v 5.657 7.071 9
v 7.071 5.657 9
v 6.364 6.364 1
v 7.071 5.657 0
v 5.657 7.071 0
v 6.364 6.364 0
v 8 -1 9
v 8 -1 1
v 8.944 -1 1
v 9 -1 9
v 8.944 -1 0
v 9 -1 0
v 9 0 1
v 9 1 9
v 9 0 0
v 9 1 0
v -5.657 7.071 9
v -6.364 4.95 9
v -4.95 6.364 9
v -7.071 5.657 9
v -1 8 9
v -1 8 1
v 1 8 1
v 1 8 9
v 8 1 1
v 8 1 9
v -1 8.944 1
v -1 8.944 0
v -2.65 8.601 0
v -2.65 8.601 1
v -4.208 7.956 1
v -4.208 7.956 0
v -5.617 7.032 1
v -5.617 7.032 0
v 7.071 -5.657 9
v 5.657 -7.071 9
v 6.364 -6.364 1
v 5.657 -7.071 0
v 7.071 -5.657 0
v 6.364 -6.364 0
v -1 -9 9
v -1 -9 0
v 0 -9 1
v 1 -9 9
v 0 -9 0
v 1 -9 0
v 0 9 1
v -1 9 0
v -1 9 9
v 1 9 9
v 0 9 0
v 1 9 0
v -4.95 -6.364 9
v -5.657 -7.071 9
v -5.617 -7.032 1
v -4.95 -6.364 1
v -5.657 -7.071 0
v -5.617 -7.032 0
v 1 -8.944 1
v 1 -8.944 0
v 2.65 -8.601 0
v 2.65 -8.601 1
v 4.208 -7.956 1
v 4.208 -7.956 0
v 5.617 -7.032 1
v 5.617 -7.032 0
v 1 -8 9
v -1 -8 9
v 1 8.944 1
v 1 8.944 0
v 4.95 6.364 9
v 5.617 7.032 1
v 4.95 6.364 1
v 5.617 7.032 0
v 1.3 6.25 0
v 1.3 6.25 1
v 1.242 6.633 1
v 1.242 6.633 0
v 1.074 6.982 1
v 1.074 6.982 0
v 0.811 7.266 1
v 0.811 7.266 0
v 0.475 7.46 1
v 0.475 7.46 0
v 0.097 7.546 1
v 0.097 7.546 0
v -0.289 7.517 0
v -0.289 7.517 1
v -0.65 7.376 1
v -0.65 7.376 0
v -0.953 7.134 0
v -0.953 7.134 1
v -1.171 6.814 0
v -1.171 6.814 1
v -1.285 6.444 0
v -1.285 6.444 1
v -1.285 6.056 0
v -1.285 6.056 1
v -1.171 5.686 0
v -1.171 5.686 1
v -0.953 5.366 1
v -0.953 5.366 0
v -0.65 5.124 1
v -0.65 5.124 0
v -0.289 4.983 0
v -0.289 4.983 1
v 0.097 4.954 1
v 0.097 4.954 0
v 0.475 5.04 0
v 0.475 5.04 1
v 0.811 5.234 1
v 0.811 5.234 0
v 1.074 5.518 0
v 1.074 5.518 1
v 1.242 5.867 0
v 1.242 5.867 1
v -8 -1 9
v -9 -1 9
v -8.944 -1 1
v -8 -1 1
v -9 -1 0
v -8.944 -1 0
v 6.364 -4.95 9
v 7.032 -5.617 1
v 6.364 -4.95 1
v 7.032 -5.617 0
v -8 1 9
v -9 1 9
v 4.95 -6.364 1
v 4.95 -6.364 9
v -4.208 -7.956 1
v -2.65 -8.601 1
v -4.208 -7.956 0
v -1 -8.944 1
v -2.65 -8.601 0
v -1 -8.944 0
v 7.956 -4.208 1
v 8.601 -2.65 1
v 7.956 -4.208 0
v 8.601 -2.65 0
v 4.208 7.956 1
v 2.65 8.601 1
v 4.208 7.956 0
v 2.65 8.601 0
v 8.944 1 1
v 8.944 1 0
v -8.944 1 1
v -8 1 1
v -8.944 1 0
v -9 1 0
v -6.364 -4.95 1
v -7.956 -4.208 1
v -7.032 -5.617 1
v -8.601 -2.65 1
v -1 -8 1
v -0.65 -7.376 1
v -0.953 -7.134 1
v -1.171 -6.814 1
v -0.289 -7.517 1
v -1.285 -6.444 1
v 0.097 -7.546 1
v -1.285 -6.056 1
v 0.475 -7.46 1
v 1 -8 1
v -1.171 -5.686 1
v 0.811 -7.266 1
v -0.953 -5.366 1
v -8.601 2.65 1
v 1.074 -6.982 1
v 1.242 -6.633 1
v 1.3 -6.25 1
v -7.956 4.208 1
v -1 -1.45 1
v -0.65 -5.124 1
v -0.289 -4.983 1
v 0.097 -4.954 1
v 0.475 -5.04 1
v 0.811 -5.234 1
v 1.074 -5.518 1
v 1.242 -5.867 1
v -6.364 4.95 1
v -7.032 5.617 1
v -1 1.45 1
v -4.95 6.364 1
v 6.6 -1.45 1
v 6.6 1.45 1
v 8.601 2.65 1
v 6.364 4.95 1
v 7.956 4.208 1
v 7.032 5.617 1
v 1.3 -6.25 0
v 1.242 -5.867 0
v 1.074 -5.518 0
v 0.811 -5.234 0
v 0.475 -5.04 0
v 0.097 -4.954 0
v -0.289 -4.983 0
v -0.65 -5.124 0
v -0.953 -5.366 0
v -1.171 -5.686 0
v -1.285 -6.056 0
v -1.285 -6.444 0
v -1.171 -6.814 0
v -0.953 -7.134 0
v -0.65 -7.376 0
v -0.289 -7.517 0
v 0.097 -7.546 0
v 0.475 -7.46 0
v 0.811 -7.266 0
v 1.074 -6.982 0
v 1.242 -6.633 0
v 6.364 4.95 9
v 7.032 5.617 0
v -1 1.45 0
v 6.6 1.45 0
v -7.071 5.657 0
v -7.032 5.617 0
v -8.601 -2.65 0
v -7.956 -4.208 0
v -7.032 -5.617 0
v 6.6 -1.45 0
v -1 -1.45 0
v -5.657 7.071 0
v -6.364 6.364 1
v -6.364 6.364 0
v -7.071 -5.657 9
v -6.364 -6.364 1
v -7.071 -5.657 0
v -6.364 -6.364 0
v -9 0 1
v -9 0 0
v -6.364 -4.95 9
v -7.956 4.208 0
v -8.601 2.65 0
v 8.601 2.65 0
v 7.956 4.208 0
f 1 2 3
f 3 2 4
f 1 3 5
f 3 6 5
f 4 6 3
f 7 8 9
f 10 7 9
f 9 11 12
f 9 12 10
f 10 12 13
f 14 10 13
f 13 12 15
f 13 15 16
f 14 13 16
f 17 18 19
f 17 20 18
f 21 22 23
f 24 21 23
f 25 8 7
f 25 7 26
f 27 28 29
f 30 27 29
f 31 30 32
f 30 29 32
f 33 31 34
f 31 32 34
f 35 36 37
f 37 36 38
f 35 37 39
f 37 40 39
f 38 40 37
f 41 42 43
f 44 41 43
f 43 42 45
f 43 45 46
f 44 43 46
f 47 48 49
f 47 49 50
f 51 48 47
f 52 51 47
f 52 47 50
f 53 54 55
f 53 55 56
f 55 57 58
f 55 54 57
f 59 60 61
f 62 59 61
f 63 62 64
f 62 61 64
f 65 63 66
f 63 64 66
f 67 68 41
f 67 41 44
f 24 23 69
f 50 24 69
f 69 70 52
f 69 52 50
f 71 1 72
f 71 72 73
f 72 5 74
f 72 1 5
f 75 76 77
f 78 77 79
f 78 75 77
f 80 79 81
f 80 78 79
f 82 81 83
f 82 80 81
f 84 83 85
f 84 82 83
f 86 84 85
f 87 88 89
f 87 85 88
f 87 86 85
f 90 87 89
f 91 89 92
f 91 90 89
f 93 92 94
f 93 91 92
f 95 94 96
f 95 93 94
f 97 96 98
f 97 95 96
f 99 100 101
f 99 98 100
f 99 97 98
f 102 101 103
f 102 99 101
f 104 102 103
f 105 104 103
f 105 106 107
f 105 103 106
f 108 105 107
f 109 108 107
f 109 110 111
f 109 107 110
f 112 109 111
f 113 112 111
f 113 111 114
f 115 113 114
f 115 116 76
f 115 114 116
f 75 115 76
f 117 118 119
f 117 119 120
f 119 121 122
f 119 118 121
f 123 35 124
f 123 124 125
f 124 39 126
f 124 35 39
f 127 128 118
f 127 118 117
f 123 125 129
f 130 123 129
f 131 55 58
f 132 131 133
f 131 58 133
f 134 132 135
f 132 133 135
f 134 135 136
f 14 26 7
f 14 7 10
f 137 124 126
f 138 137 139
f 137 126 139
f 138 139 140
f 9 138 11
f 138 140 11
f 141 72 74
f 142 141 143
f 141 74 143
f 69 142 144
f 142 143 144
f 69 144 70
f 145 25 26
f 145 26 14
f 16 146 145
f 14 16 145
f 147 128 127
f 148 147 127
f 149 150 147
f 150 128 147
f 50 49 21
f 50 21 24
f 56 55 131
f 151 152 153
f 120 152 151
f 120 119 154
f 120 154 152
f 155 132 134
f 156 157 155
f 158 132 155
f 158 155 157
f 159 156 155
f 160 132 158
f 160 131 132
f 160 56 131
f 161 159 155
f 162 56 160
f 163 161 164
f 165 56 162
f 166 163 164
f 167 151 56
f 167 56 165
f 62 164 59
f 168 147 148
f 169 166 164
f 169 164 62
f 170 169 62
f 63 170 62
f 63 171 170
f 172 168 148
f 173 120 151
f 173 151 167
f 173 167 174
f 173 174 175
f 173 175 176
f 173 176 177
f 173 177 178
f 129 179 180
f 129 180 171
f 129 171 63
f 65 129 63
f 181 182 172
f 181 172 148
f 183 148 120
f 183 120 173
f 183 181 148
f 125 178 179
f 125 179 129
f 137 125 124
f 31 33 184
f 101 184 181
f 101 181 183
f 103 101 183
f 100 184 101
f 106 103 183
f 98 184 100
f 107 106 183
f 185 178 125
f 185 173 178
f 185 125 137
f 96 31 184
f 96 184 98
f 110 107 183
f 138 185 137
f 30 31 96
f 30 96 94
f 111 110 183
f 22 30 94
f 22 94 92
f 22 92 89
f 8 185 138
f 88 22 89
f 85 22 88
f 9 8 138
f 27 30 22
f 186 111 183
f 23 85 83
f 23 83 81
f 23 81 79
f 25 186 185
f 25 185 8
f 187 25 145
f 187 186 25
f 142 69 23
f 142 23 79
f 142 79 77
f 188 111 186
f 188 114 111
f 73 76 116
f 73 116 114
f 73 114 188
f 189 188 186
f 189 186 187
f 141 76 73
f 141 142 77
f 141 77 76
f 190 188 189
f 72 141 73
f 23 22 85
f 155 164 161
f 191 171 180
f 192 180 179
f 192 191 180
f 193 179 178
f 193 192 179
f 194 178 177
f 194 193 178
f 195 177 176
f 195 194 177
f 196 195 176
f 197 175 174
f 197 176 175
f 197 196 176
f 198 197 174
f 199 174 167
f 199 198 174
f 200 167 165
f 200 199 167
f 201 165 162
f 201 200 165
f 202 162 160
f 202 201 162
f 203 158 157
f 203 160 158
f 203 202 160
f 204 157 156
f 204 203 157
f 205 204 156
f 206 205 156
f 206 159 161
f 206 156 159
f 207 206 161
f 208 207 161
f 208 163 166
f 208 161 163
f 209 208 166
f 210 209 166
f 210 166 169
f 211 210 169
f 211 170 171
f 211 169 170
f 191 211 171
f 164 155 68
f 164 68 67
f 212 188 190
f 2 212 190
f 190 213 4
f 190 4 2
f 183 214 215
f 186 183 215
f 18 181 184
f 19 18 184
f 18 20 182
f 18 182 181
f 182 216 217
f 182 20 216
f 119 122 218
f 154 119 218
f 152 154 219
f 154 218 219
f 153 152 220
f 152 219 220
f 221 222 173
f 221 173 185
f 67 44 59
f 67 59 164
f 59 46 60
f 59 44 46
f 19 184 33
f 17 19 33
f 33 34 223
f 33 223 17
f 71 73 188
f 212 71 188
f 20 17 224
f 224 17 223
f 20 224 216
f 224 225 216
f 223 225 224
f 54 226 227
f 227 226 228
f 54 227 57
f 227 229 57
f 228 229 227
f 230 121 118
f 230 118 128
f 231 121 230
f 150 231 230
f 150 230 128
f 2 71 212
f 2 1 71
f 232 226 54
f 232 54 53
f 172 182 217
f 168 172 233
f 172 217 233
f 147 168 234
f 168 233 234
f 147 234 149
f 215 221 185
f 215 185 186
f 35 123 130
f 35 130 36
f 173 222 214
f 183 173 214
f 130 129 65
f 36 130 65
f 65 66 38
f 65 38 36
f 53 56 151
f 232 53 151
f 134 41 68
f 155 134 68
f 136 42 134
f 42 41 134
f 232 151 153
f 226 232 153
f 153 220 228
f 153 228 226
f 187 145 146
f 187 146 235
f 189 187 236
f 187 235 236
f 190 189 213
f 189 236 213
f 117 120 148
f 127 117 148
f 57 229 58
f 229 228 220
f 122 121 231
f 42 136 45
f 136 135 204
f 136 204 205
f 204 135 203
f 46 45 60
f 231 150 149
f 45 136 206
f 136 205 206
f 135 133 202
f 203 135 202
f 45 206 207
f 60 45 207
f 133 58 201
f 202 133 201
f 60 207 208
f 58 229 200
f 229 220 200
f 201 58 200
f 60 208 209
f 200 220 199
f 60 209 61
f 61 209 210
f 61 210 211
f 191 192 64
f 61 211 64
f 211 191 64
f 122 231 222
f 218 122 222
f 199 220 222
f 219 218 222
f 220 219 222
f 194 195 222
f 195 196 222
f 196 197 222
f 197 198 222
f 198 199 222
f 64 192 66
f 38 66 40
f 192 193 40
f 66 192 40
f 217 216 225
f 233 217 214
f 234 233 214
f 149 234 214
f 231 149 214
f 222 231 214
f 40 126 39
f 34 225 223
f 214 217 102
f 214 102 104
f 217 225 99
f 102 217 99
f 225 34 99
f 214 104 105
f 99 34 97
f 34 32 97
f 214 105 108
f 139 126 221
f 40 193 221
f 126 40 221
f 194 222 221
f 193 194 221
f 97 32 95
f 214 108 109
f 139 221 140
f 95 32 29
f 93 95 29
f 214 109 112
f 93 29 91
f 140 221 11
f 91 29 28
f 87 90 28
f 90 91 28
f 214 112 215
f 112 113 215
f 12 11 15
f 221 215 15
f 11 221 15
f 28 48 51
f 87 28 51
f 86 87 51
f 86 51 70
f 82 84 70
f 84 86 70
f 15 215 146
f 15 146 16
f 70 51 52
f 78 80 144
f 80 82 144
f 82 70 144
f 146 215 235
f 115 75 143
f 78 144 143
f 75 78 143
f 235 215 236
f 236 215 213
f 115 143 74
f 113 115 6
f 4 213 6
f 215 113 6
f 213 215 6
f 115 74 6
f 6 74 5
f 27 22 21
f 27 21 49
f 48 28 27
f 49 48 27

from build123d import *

# Parameters (mm, degrees)
SKETCH_1_R          = 9
EXTRUDE_1_DEPTH     = 1
SKETCH_2_R          = 1.3
CUT_EXTRUDE_1_DEPTH = 2
SKETCH_4_W          = 7.6
SKETCH_4_H          = 2.9
CUT_EXTRUDE_6_DEPTH = 2
SKETCH_5_W          = 1
SKETCH_5_H          = 2
SKETCH_5_W_2        = 2
SKETCH_5_H_2        = 1
EXTRUDE_3_DEPTH     = 9


with BuildPart() as part:
    # ｽｹｯﾁ1 → ﾎﾞｽ - 押し出し1 (new body)
    with BuildSketch(Plane.XY):
        Circle(SKETCH_1_R)
    extrude(amount=EXTRUDE_1_DEPTH)

    # ｽｹｯﾁ2 → ｶｯﾄ - 押し出し1 (cut, through all)
    with BuildSketch(Plane.XY):
        with Locations((0, 6.25)):
            Circle(SKETCH_2_R)
        with Locations((0, -6.25)):
            Circle(SKETCH_2_R)
    extrude(amount=CUT_EXTRUDE_1_DEPTH, mode=Mode.SUBTRACT)

    # ｽｹｯﾁ4 → ｶｯﾄ - 押し出し6 (cut, through all)
    with BuildSketch(Plane.XY):
        with Locations((2.8, 0)):
            Rectangle(SKETCH_4_W, SKETCH_4_H)
    extrude(amount=CUT_EXTRUDE_6_DEPTH, mode=Mode.SUBTRACT)

    # ｽｹｯﾁ5 → ﾎﾞｽ - 押し出し3 (add)
    with BuildSketch(Plane.XY):
        Polygon((-6.363961031, 4.949747468), (-4.949747468, 6.363961031), (-5.656854249, 7.071067812), (-7.071067812, 5.656854249), align=None)
        with Locations((-8.5, 0)):
            Rectangle(SKETCH_5_W, SKETCH_5_H)
        with Locations((0, 8.5)):
            Rectangle(SKETCH_5_W_2, SKETCH_5_H_2)
        Polygon((4.949747468, 6.363961031), (6.363961031, 4.949747468), (7.071067812, 5.656854249), (5.656854249, 7.071067812), align=None)
        with Locations((8.5, 0)):
            Rectangle(SKETCH_5_W, SKETCH_5_H)
        Polygon((6.363961031, -4.949747468), (4.949747468, -6.363961031), (5.656854249, -7.071067812), (7.071067812, -5.656854249), align=None)
        with Locations((0, -8.5)):
            Rectangle(SKETCH_5_W_2, SKETCH_5_H_2)
        Polygon((-4.949747468, -6.363961031), (-6.363961031, -4.949747468), (-7.071067812, -5.656854249), (-5.656854249, -7.071067812), align=None)
    extrude(amount=EXTRUDE_3_DEPTH)


solid = part.part
